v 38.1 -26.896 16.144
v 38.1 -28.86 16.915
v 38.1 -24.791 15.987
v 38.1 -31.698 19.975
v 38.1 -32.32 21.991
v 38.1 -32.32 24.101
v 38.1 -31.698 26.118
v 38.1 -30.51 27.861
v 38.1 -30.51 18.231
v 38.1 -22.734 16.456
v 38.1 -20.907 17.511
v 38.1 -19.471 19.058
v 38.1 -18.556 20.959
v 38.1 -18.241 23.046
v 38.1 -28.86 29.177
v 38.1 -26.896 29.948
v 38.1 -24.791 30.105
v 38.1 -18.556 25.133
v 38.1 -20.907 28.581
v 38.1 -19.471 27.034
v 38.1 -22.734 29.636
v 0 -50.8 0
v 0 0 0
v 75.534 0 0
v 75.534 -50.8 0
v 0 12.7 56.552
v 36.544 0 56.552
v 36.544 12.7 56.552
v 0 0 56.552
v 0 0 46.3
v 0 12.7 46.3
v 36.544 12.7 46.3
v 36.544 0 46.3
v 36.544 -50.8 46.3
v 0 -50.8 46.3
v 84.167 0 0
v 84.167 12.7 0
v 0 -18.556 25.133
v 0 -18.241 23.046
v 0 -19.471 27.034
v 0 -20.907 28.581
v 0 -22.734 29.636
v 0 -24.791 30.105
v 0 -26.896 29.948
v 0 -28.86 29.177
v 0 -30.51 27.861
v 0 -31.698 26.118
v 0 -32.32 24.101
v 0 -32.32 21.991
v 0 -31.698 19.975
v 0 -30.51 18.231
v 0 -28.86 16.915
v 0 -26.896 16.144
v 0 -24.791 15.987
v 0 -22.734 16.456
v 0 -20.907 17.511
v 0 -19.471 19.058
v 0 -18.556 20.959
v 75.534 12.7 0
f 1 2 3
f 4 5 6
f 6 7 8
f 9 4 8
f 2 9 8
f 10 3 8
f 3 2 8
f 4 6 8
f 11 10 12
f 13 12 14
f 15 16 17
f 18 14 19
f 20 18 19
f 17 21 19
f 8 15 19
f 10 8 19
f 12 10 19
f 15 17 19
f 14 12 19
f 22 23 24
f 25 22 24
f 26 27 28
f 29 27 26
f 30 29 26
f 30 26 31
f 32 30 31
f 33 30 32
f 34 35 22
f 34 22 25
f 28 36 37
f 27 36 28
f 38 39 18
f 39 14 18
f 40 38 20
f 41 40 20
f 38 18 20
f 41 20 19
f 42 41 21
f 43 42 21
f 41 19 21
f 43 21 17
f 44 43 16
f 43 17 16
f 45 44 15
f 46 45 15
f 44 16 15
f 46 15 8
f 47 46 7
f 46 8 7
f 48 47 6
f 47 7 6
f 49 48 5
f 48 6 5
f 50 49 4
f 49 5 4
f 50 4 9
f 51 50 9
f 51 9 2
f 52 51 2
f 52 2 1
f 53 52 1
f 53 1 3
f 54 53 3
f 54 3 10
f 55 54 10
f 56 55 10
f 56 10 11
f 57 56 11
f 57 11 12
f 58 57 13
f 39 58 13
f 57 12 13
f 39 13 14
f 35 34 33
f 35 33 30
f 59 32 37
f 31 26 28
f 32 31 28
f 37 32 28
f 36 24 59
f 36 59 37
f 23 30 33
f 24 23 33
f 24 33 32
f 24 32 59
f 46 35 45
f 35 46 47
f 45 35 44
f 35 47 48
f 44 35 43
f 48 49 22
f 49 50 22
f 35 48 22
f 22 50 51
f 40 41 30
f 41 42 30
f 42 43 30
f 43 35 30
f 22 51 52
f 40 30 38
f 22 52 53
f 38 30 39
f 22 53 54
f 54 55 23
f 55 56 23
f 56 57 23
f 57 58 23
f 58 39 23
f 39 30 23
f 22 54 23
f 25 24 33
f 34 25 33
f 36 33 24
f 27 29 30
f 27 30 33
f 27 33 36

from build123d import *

# Parameters (mm, degrees)
F1_DEPTH = 50.8
F2_DEPTH = 12.7
F3_R     = 7.079162
F4_DEPTH = 38.1


with BuildPart() as f1:
    # F0 (on Front) → F1 (new body)
    with BuildSketch(Plane.XZ):
        Polygon((0, 46.30015), (0, 0), (75.533654, 0), (36.544055, 46.30015), align=None)
    extrude(amount=F1_DEPTH)

    # F3 (on Right) → F4 (cut, symmetric)
    with BuildSketch(Plane.YZ):
        with Locations((-25.320366, 23.04608)):
            Circle(F3_R)
    extrude(amount=F4_DEPTH, both=True, mode=Mode.SUBTRACT)


with BuildPart() as f2:
    # F0 (on Front) → F2 (new body)
    with BuildSketch(Plane.XZ):
        Polygon((0, 56.552324), (0, 46.30015), (36.544055, 46.30015), (75.533654, 0), (84.167063, 0), (36.544055, 56.552324), align=None)
    extrude(amount=-F2_DEPTH)


solid = Compound([f1.part, f2.part])
